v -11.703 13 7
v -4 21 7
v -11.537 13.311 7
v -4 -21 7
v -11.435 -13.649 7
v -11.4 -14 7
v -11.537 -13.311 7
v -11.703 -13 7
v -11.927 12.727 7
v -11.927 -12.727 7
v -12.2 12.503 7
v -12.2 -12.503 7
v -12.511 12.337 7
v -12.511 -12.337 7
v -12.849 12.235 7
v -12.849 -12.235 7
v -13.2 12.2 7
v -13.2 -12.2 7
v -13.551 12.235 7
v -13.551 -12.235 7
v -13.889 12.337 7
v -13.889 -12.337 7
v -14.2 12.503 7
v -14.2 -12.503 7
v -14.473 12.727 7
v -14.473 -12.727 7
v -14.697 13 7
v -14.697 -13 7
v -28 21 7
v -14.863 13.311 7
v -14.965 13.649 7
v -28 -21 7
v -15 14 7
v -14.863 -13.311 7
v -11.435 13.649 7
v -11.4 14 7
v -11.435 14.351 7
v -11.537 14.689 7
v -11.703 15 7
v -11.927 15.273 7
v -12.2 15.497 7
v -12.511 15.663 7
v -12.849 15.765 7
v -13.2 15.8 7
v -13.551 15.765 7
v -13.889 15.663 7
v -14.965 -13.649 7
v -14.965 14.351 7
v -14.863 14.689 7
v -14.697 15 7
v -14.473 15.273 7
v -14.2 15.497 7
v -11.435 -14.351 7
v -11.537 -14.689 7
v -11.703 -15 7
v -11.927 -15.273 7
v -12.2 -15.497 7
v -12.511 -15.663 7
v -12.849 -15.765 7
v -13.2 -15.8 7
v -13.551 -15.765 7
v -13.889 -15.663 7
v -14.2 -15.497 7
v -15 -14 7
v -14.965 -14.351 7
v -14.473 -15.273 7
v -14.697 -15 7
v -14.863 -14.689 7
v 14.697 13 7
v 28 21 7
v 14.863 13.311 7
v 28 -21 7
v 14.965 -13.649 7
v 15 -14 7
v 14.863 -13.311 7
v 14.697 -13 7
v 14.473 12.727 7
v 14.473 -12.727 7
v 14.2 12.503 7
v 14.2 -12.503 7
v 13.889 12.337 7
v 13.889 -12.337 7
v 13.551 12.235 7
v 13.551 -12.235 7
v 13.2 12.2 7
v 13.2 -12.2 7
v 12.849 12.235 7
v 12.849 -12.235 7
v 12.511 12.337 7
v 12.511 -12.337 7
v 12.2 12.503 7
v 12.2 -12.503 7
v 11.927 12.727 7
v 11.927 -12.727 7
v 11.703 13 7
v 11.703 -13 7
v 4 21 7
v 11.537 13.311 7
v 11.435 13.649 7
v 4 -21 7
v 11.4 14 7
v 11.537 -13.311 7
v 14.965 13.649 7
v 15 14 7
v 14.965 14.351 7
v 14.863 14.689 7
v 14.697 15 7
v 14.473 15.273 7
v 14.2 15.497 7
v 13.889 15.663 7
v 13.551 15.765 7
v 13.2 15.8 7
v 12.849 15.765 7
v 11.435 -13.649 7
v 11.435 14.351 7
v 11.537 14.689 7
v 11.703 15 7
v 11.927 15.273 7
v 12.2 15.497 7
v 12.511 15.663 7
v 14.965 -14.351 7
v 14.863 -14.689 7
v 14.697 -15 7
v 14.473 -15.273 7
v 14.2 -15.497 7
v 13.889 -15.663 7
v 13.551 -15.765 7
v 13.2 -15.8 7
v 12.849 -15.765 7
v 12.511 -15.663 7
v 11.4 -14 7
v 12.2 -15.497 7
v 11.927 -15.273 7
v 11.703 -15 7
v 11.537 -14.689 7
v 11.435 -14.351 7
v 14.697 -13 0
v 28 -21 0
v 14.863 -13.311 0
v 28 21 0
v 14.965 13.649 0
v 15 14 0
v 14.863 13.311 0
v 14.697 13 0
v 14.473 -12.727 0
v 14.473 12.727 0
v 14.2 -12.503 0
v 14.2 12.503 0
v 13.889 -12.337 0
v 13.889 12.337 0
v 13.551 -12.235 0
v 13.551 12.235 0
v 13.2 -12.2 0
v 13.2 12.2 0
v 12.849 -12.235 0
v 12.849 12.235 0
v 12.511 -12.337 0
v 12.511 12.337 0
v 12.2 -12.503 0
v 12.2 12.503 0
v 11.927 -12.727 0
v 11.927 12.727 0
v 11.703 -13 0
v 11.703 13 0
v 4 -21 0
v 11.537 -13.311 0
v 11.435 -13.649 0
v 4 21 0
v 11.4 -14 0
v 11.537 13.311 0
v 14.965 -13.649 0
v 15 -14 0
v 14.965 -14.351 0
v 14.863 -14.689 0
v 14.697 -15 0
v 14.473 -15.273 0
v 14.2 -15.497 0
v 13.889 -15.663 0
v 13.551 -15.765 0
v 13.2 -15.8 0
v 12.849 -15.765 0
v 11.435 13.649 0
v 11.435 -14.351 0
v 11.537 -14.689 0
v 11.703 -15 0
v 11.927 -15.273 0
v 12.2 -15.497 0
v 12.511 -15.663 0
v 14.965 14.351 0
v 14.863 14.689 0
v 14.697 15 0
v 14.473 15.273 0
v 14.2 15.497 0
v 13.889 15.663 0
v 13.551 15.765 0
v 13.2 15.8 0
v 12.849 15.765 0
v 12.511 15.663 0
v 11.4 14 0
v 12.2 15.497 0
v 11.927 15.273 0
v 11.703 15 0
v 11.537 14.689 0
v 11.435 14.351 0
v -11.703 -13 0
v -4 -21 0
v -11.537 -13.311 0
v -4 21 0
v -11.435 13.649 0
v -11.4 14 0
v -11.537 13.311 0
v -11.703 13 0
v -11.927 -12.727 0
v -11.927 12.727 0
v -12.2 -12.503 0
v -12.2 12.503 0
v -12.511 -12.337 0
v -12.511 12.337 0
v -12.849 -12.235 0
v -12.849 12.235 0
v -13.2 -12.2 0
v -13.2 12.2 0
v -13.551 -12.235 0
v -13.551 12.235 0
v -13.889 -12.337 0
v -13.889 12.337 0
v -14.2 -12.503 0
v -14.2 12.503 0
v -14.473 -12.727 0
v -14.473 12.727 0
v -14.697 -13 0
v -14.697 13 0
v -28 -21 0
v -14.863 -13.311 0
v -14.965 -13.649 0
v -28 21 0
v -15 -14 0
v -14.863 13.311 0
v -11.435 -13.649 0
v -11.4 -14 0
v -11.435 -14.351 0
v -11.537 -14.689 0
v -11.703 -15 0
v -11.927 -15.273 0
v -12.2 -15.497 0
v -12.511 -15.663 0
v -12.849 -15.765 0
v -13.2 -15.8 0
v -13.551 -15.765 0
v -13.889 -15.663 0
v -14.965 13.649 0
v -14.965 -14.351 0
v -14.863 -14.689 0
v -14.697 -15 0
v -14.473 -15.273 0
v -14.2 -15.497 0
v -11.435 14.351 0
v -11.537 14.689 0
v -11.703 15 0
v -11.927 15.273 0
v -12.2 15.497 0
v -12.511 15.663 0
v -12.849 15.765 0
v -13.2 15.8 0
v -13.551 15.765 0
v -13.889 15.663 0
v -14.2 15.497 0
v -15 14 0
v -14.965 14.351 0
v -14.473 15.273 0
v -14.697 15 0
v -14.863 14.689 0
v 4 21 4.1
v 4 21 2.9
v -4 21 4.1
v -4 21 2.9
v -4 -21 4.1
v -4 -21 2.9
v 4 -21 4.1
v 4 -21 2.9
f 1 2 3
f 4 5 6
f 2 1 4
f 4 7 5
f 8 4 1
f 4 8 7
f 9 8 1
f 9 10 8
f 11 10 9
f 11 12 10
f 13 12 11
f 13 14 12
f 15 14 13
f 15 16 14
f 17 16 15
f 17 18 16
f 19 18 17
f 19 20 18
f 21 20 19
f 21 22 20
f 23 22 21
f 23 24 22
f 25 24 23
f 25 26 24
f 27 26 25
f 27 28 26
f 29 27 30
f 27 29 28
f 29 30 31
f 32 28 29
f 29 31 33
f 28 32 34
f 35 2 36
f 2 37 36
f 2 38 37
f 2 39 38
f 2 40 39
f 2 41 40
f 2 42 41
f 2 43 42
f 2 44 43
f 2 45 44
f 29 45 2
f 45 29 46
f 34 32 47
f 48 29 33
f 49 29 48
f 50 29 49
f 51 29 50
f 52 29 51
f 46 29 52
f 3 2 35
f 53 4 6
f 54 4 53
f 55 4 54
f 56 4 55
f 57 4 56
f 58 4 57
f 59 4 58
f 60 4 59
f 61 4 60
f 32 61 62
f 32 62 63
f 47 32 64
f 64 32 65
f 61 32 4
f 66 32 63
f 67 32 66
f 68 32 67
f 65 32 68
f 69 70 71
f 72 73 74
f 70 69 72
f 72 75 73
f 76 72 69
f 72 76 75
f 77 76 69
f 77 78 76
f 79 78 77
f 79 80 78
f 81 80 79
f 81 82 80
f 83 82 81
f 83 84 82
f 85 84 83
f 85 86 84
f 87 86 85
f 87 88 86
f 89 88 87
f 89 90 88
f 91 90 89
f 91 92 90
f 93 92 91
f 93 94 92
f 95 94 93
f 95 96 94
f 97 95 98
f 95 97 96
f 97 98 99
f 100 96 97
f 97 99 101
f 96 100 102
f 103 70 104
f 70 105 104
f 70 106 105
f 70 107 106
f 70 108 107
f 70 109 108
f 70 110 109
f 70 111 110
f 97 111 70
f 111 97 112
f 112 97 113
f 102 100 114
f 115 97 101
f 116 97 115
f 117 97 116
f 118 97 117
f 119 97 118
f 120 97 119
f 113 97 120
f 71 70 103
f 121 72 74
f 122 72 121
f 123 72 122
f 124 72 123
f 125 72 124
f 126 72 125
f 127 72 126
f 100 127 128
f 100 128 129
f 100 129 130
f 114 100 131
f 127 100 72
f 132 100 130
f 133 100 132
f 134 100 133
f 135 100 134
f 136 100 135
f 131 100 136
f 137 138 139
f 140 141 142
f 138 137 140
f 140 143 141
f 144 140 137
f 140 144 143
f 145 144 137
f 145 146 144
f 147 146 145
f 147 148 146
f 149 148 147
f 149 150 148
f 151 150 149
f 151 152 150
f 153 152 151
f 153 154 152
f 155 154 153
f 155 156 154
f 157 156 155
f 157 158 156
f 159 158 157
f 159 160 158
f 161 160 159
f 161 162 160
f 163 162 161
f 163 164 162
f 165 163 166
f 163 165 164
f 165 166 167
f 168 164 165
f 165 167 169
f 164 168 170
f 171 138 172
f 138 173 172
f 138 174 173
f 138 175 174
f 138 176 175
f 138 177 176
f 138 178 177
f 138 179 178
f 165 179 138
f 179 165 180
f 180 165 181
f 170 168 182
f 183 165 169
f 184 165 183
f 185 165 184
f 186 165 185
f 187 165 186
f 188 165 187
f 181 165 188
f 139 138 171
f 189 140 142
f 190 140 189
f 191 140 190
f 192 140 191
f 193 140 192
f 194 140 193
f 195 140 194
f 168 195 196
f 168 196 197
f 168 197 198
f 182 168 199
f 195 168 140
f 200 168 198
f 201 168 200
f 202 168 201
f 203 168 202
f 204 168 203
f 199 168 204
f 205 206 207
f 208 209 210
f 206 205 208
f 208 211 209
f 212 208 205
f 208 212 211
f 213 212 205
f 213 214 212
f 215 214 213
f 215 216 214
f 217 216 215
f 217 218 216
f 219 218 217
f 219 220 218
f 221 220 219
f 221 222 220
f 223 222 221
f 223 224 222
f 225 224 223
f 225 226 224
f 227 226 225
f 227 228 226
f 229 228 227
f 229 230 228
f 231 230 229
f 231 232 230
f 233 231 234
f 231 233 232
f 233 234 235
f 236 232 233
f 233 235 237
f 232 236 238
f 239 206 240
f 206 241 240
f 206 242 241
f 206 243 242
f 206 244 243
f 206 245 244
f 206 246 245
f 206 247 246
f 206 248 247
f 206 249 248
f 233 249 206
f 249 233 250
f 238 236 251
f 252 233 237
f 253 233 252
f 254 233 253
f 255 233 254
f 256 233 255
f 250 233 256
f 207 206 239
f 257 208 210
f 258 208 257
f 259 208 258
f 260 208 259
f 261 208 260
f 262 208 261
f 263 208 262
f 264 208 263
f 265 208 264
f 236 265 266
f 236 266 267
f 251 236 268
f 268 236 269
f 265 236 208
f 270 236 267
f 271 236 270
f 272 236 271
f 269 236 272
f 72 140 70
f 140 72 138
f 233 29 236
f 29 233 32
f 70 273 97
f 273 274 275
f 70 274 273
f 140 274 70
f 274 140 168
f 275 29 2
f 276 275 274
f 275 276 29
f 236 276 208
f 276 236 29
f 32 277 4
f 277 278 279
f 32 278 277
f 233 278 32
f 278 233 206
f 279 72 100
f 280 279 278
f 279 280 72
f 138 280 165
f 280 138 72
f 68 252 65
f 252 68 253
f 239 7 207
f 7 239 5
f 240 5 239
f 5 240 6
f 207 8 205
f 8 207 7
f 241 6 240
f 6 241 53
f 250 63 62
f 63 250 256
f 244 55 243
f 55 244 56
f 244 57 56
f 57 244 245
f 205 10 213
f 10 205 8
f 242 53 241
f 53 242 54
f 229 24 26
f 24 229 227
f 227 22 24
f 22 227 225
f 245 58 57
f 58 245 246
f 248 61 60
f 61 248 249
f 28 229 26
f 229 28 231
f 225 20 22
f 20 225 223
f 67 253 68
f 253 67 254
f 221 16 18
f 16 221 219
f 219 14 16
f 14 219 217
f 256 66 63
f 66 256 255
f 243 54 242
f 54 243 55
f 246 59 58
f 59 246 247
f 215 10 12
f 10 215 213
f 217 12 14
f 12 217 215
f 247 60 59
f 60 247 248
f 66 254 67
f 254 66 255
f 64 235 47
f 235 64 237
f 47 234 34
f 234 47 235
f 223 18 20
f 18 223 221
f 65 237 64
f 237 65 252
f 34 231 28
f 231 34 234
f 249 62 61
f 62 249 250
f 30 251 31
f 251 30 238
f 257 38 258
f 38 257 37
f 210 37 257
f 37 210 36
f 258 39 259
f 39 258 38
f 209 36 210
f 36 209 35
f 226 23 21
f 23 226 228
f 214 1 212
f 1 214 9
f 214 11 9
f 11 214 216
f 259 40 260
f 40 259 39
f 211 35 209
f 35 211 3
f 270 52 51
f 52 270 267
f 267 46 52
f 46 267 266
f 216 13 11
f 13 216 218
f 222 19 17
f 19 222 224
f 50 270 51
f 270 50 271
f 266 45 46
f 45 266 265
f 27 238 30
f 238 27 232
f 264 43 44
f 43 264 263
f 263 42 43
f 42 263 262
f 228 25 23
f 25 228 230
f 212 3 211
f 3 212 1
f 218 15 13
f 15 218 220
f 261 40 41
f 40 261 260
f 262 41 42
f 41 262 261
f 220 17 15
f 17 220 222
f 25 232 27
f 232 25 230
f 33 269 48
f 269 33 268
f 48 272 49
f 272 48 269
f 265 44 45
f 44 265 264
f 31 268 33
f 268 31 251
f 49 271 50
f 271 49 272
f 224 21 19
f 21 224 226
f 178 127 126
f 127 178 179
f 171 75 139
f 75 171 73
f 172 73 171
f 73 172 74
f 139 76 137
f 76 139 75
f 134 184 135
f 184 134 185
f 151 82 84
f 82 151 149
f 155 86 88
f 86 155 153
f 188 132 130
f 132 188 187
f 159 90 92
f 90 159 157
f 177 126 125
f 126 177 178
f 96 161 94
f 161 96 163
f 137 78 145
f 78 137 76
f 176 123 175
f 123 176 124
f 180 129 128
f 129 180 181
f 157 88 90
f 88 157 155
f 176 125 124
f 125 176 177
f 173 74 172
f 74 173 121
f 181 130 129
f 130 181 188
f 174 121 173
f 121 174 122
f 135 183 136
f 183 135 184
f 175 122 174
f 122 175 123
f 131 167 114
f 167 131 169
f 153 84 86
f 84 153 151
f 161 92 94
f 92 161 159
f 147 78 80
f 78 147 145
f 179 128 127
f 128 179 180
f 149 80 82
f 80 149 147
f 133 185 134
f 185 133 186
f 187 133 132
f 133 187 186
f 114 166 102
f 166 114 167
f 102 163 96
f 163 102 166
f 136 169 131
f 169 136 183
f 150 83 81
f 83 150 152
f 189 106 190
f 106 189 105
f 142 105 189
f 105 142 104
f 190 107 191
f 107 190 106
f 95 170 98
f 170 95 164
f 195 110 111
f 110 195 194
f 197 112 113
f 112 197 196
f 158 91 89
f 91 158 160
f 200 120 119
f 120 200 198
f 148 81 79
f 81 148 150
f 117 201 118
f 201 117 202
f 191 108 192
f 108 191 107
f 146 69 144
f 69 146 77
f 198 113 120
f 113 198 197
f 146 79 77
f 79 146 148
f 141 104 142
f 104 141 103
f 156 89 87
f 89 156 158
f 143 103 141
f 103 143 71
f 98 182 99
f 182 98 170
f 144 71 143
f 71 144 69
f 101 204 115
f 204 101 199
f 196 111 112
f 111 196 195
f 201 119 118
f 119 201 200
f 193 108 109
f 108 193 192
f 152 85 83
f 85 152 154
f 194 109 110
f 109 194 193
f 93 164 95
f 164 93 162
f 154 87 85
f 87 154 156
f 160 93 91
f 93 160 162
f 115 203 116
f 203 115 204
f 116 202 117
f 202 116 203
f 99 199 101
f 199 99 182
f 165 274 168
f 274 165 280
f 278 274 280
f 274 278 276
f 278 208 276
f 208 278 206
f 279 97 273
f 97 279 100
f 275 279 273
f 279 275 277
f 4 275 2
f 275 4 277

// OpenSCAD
$fn = 32;

// ----------------------------------------------------------------------
// Living hinge: 56 x 42 mm plates, 1.2 mm flexible web
// ----------------------------------------------------------------------

// --- parameters (mm) ---
plate_len = 24;           // plate length outside the web
plate_w = 42;             // plate width
thick = 7;                // plate thickness
web_half = 4;             // half width of the flex band
web_t = 1.2;              // flexible web thickness
web_z = 2.9;              // web position inside the thickness
boss_d = 10;              // screw boss diameter
boss_h = 7;               // screw boss height
boss_x = 13.2;            // screw boss distance from the web
screw_d = 3.6;            // screw hole

difference() {
  union() {
    /* one flat strip, later thinned at the middle */
    translate([-28, -21, 0]) cube([56, 42, 7]);
    /* screw bosses, sunk 0.5 mm into the plates */
    for (sx = [-13.2, 13.2]) {
      for (sy = [-14, 14]) {
        translate([sx, sy, 0]) cylinder(h = boss_h, d = boss_d);
      }
    }
  }
  /* channel from below: leaves the web on top of it */
  translate([-4, -23.5, -2.5]) cube([8, 47, 5.4]);
  /* channel from above: thins the web down to web_t */
  translate([-4, -23.5, 4.1]) cube([8, 47, 5.4]);
  /* screw holes through the bosses */
  for (sx = [-13.2, 13.2]) {
    for (sy = [-14, 14]) {
      translate([sx, sy, -2.5]) cylinder(h = boss_h + 5, d = screw_d);
    }
  }
}
